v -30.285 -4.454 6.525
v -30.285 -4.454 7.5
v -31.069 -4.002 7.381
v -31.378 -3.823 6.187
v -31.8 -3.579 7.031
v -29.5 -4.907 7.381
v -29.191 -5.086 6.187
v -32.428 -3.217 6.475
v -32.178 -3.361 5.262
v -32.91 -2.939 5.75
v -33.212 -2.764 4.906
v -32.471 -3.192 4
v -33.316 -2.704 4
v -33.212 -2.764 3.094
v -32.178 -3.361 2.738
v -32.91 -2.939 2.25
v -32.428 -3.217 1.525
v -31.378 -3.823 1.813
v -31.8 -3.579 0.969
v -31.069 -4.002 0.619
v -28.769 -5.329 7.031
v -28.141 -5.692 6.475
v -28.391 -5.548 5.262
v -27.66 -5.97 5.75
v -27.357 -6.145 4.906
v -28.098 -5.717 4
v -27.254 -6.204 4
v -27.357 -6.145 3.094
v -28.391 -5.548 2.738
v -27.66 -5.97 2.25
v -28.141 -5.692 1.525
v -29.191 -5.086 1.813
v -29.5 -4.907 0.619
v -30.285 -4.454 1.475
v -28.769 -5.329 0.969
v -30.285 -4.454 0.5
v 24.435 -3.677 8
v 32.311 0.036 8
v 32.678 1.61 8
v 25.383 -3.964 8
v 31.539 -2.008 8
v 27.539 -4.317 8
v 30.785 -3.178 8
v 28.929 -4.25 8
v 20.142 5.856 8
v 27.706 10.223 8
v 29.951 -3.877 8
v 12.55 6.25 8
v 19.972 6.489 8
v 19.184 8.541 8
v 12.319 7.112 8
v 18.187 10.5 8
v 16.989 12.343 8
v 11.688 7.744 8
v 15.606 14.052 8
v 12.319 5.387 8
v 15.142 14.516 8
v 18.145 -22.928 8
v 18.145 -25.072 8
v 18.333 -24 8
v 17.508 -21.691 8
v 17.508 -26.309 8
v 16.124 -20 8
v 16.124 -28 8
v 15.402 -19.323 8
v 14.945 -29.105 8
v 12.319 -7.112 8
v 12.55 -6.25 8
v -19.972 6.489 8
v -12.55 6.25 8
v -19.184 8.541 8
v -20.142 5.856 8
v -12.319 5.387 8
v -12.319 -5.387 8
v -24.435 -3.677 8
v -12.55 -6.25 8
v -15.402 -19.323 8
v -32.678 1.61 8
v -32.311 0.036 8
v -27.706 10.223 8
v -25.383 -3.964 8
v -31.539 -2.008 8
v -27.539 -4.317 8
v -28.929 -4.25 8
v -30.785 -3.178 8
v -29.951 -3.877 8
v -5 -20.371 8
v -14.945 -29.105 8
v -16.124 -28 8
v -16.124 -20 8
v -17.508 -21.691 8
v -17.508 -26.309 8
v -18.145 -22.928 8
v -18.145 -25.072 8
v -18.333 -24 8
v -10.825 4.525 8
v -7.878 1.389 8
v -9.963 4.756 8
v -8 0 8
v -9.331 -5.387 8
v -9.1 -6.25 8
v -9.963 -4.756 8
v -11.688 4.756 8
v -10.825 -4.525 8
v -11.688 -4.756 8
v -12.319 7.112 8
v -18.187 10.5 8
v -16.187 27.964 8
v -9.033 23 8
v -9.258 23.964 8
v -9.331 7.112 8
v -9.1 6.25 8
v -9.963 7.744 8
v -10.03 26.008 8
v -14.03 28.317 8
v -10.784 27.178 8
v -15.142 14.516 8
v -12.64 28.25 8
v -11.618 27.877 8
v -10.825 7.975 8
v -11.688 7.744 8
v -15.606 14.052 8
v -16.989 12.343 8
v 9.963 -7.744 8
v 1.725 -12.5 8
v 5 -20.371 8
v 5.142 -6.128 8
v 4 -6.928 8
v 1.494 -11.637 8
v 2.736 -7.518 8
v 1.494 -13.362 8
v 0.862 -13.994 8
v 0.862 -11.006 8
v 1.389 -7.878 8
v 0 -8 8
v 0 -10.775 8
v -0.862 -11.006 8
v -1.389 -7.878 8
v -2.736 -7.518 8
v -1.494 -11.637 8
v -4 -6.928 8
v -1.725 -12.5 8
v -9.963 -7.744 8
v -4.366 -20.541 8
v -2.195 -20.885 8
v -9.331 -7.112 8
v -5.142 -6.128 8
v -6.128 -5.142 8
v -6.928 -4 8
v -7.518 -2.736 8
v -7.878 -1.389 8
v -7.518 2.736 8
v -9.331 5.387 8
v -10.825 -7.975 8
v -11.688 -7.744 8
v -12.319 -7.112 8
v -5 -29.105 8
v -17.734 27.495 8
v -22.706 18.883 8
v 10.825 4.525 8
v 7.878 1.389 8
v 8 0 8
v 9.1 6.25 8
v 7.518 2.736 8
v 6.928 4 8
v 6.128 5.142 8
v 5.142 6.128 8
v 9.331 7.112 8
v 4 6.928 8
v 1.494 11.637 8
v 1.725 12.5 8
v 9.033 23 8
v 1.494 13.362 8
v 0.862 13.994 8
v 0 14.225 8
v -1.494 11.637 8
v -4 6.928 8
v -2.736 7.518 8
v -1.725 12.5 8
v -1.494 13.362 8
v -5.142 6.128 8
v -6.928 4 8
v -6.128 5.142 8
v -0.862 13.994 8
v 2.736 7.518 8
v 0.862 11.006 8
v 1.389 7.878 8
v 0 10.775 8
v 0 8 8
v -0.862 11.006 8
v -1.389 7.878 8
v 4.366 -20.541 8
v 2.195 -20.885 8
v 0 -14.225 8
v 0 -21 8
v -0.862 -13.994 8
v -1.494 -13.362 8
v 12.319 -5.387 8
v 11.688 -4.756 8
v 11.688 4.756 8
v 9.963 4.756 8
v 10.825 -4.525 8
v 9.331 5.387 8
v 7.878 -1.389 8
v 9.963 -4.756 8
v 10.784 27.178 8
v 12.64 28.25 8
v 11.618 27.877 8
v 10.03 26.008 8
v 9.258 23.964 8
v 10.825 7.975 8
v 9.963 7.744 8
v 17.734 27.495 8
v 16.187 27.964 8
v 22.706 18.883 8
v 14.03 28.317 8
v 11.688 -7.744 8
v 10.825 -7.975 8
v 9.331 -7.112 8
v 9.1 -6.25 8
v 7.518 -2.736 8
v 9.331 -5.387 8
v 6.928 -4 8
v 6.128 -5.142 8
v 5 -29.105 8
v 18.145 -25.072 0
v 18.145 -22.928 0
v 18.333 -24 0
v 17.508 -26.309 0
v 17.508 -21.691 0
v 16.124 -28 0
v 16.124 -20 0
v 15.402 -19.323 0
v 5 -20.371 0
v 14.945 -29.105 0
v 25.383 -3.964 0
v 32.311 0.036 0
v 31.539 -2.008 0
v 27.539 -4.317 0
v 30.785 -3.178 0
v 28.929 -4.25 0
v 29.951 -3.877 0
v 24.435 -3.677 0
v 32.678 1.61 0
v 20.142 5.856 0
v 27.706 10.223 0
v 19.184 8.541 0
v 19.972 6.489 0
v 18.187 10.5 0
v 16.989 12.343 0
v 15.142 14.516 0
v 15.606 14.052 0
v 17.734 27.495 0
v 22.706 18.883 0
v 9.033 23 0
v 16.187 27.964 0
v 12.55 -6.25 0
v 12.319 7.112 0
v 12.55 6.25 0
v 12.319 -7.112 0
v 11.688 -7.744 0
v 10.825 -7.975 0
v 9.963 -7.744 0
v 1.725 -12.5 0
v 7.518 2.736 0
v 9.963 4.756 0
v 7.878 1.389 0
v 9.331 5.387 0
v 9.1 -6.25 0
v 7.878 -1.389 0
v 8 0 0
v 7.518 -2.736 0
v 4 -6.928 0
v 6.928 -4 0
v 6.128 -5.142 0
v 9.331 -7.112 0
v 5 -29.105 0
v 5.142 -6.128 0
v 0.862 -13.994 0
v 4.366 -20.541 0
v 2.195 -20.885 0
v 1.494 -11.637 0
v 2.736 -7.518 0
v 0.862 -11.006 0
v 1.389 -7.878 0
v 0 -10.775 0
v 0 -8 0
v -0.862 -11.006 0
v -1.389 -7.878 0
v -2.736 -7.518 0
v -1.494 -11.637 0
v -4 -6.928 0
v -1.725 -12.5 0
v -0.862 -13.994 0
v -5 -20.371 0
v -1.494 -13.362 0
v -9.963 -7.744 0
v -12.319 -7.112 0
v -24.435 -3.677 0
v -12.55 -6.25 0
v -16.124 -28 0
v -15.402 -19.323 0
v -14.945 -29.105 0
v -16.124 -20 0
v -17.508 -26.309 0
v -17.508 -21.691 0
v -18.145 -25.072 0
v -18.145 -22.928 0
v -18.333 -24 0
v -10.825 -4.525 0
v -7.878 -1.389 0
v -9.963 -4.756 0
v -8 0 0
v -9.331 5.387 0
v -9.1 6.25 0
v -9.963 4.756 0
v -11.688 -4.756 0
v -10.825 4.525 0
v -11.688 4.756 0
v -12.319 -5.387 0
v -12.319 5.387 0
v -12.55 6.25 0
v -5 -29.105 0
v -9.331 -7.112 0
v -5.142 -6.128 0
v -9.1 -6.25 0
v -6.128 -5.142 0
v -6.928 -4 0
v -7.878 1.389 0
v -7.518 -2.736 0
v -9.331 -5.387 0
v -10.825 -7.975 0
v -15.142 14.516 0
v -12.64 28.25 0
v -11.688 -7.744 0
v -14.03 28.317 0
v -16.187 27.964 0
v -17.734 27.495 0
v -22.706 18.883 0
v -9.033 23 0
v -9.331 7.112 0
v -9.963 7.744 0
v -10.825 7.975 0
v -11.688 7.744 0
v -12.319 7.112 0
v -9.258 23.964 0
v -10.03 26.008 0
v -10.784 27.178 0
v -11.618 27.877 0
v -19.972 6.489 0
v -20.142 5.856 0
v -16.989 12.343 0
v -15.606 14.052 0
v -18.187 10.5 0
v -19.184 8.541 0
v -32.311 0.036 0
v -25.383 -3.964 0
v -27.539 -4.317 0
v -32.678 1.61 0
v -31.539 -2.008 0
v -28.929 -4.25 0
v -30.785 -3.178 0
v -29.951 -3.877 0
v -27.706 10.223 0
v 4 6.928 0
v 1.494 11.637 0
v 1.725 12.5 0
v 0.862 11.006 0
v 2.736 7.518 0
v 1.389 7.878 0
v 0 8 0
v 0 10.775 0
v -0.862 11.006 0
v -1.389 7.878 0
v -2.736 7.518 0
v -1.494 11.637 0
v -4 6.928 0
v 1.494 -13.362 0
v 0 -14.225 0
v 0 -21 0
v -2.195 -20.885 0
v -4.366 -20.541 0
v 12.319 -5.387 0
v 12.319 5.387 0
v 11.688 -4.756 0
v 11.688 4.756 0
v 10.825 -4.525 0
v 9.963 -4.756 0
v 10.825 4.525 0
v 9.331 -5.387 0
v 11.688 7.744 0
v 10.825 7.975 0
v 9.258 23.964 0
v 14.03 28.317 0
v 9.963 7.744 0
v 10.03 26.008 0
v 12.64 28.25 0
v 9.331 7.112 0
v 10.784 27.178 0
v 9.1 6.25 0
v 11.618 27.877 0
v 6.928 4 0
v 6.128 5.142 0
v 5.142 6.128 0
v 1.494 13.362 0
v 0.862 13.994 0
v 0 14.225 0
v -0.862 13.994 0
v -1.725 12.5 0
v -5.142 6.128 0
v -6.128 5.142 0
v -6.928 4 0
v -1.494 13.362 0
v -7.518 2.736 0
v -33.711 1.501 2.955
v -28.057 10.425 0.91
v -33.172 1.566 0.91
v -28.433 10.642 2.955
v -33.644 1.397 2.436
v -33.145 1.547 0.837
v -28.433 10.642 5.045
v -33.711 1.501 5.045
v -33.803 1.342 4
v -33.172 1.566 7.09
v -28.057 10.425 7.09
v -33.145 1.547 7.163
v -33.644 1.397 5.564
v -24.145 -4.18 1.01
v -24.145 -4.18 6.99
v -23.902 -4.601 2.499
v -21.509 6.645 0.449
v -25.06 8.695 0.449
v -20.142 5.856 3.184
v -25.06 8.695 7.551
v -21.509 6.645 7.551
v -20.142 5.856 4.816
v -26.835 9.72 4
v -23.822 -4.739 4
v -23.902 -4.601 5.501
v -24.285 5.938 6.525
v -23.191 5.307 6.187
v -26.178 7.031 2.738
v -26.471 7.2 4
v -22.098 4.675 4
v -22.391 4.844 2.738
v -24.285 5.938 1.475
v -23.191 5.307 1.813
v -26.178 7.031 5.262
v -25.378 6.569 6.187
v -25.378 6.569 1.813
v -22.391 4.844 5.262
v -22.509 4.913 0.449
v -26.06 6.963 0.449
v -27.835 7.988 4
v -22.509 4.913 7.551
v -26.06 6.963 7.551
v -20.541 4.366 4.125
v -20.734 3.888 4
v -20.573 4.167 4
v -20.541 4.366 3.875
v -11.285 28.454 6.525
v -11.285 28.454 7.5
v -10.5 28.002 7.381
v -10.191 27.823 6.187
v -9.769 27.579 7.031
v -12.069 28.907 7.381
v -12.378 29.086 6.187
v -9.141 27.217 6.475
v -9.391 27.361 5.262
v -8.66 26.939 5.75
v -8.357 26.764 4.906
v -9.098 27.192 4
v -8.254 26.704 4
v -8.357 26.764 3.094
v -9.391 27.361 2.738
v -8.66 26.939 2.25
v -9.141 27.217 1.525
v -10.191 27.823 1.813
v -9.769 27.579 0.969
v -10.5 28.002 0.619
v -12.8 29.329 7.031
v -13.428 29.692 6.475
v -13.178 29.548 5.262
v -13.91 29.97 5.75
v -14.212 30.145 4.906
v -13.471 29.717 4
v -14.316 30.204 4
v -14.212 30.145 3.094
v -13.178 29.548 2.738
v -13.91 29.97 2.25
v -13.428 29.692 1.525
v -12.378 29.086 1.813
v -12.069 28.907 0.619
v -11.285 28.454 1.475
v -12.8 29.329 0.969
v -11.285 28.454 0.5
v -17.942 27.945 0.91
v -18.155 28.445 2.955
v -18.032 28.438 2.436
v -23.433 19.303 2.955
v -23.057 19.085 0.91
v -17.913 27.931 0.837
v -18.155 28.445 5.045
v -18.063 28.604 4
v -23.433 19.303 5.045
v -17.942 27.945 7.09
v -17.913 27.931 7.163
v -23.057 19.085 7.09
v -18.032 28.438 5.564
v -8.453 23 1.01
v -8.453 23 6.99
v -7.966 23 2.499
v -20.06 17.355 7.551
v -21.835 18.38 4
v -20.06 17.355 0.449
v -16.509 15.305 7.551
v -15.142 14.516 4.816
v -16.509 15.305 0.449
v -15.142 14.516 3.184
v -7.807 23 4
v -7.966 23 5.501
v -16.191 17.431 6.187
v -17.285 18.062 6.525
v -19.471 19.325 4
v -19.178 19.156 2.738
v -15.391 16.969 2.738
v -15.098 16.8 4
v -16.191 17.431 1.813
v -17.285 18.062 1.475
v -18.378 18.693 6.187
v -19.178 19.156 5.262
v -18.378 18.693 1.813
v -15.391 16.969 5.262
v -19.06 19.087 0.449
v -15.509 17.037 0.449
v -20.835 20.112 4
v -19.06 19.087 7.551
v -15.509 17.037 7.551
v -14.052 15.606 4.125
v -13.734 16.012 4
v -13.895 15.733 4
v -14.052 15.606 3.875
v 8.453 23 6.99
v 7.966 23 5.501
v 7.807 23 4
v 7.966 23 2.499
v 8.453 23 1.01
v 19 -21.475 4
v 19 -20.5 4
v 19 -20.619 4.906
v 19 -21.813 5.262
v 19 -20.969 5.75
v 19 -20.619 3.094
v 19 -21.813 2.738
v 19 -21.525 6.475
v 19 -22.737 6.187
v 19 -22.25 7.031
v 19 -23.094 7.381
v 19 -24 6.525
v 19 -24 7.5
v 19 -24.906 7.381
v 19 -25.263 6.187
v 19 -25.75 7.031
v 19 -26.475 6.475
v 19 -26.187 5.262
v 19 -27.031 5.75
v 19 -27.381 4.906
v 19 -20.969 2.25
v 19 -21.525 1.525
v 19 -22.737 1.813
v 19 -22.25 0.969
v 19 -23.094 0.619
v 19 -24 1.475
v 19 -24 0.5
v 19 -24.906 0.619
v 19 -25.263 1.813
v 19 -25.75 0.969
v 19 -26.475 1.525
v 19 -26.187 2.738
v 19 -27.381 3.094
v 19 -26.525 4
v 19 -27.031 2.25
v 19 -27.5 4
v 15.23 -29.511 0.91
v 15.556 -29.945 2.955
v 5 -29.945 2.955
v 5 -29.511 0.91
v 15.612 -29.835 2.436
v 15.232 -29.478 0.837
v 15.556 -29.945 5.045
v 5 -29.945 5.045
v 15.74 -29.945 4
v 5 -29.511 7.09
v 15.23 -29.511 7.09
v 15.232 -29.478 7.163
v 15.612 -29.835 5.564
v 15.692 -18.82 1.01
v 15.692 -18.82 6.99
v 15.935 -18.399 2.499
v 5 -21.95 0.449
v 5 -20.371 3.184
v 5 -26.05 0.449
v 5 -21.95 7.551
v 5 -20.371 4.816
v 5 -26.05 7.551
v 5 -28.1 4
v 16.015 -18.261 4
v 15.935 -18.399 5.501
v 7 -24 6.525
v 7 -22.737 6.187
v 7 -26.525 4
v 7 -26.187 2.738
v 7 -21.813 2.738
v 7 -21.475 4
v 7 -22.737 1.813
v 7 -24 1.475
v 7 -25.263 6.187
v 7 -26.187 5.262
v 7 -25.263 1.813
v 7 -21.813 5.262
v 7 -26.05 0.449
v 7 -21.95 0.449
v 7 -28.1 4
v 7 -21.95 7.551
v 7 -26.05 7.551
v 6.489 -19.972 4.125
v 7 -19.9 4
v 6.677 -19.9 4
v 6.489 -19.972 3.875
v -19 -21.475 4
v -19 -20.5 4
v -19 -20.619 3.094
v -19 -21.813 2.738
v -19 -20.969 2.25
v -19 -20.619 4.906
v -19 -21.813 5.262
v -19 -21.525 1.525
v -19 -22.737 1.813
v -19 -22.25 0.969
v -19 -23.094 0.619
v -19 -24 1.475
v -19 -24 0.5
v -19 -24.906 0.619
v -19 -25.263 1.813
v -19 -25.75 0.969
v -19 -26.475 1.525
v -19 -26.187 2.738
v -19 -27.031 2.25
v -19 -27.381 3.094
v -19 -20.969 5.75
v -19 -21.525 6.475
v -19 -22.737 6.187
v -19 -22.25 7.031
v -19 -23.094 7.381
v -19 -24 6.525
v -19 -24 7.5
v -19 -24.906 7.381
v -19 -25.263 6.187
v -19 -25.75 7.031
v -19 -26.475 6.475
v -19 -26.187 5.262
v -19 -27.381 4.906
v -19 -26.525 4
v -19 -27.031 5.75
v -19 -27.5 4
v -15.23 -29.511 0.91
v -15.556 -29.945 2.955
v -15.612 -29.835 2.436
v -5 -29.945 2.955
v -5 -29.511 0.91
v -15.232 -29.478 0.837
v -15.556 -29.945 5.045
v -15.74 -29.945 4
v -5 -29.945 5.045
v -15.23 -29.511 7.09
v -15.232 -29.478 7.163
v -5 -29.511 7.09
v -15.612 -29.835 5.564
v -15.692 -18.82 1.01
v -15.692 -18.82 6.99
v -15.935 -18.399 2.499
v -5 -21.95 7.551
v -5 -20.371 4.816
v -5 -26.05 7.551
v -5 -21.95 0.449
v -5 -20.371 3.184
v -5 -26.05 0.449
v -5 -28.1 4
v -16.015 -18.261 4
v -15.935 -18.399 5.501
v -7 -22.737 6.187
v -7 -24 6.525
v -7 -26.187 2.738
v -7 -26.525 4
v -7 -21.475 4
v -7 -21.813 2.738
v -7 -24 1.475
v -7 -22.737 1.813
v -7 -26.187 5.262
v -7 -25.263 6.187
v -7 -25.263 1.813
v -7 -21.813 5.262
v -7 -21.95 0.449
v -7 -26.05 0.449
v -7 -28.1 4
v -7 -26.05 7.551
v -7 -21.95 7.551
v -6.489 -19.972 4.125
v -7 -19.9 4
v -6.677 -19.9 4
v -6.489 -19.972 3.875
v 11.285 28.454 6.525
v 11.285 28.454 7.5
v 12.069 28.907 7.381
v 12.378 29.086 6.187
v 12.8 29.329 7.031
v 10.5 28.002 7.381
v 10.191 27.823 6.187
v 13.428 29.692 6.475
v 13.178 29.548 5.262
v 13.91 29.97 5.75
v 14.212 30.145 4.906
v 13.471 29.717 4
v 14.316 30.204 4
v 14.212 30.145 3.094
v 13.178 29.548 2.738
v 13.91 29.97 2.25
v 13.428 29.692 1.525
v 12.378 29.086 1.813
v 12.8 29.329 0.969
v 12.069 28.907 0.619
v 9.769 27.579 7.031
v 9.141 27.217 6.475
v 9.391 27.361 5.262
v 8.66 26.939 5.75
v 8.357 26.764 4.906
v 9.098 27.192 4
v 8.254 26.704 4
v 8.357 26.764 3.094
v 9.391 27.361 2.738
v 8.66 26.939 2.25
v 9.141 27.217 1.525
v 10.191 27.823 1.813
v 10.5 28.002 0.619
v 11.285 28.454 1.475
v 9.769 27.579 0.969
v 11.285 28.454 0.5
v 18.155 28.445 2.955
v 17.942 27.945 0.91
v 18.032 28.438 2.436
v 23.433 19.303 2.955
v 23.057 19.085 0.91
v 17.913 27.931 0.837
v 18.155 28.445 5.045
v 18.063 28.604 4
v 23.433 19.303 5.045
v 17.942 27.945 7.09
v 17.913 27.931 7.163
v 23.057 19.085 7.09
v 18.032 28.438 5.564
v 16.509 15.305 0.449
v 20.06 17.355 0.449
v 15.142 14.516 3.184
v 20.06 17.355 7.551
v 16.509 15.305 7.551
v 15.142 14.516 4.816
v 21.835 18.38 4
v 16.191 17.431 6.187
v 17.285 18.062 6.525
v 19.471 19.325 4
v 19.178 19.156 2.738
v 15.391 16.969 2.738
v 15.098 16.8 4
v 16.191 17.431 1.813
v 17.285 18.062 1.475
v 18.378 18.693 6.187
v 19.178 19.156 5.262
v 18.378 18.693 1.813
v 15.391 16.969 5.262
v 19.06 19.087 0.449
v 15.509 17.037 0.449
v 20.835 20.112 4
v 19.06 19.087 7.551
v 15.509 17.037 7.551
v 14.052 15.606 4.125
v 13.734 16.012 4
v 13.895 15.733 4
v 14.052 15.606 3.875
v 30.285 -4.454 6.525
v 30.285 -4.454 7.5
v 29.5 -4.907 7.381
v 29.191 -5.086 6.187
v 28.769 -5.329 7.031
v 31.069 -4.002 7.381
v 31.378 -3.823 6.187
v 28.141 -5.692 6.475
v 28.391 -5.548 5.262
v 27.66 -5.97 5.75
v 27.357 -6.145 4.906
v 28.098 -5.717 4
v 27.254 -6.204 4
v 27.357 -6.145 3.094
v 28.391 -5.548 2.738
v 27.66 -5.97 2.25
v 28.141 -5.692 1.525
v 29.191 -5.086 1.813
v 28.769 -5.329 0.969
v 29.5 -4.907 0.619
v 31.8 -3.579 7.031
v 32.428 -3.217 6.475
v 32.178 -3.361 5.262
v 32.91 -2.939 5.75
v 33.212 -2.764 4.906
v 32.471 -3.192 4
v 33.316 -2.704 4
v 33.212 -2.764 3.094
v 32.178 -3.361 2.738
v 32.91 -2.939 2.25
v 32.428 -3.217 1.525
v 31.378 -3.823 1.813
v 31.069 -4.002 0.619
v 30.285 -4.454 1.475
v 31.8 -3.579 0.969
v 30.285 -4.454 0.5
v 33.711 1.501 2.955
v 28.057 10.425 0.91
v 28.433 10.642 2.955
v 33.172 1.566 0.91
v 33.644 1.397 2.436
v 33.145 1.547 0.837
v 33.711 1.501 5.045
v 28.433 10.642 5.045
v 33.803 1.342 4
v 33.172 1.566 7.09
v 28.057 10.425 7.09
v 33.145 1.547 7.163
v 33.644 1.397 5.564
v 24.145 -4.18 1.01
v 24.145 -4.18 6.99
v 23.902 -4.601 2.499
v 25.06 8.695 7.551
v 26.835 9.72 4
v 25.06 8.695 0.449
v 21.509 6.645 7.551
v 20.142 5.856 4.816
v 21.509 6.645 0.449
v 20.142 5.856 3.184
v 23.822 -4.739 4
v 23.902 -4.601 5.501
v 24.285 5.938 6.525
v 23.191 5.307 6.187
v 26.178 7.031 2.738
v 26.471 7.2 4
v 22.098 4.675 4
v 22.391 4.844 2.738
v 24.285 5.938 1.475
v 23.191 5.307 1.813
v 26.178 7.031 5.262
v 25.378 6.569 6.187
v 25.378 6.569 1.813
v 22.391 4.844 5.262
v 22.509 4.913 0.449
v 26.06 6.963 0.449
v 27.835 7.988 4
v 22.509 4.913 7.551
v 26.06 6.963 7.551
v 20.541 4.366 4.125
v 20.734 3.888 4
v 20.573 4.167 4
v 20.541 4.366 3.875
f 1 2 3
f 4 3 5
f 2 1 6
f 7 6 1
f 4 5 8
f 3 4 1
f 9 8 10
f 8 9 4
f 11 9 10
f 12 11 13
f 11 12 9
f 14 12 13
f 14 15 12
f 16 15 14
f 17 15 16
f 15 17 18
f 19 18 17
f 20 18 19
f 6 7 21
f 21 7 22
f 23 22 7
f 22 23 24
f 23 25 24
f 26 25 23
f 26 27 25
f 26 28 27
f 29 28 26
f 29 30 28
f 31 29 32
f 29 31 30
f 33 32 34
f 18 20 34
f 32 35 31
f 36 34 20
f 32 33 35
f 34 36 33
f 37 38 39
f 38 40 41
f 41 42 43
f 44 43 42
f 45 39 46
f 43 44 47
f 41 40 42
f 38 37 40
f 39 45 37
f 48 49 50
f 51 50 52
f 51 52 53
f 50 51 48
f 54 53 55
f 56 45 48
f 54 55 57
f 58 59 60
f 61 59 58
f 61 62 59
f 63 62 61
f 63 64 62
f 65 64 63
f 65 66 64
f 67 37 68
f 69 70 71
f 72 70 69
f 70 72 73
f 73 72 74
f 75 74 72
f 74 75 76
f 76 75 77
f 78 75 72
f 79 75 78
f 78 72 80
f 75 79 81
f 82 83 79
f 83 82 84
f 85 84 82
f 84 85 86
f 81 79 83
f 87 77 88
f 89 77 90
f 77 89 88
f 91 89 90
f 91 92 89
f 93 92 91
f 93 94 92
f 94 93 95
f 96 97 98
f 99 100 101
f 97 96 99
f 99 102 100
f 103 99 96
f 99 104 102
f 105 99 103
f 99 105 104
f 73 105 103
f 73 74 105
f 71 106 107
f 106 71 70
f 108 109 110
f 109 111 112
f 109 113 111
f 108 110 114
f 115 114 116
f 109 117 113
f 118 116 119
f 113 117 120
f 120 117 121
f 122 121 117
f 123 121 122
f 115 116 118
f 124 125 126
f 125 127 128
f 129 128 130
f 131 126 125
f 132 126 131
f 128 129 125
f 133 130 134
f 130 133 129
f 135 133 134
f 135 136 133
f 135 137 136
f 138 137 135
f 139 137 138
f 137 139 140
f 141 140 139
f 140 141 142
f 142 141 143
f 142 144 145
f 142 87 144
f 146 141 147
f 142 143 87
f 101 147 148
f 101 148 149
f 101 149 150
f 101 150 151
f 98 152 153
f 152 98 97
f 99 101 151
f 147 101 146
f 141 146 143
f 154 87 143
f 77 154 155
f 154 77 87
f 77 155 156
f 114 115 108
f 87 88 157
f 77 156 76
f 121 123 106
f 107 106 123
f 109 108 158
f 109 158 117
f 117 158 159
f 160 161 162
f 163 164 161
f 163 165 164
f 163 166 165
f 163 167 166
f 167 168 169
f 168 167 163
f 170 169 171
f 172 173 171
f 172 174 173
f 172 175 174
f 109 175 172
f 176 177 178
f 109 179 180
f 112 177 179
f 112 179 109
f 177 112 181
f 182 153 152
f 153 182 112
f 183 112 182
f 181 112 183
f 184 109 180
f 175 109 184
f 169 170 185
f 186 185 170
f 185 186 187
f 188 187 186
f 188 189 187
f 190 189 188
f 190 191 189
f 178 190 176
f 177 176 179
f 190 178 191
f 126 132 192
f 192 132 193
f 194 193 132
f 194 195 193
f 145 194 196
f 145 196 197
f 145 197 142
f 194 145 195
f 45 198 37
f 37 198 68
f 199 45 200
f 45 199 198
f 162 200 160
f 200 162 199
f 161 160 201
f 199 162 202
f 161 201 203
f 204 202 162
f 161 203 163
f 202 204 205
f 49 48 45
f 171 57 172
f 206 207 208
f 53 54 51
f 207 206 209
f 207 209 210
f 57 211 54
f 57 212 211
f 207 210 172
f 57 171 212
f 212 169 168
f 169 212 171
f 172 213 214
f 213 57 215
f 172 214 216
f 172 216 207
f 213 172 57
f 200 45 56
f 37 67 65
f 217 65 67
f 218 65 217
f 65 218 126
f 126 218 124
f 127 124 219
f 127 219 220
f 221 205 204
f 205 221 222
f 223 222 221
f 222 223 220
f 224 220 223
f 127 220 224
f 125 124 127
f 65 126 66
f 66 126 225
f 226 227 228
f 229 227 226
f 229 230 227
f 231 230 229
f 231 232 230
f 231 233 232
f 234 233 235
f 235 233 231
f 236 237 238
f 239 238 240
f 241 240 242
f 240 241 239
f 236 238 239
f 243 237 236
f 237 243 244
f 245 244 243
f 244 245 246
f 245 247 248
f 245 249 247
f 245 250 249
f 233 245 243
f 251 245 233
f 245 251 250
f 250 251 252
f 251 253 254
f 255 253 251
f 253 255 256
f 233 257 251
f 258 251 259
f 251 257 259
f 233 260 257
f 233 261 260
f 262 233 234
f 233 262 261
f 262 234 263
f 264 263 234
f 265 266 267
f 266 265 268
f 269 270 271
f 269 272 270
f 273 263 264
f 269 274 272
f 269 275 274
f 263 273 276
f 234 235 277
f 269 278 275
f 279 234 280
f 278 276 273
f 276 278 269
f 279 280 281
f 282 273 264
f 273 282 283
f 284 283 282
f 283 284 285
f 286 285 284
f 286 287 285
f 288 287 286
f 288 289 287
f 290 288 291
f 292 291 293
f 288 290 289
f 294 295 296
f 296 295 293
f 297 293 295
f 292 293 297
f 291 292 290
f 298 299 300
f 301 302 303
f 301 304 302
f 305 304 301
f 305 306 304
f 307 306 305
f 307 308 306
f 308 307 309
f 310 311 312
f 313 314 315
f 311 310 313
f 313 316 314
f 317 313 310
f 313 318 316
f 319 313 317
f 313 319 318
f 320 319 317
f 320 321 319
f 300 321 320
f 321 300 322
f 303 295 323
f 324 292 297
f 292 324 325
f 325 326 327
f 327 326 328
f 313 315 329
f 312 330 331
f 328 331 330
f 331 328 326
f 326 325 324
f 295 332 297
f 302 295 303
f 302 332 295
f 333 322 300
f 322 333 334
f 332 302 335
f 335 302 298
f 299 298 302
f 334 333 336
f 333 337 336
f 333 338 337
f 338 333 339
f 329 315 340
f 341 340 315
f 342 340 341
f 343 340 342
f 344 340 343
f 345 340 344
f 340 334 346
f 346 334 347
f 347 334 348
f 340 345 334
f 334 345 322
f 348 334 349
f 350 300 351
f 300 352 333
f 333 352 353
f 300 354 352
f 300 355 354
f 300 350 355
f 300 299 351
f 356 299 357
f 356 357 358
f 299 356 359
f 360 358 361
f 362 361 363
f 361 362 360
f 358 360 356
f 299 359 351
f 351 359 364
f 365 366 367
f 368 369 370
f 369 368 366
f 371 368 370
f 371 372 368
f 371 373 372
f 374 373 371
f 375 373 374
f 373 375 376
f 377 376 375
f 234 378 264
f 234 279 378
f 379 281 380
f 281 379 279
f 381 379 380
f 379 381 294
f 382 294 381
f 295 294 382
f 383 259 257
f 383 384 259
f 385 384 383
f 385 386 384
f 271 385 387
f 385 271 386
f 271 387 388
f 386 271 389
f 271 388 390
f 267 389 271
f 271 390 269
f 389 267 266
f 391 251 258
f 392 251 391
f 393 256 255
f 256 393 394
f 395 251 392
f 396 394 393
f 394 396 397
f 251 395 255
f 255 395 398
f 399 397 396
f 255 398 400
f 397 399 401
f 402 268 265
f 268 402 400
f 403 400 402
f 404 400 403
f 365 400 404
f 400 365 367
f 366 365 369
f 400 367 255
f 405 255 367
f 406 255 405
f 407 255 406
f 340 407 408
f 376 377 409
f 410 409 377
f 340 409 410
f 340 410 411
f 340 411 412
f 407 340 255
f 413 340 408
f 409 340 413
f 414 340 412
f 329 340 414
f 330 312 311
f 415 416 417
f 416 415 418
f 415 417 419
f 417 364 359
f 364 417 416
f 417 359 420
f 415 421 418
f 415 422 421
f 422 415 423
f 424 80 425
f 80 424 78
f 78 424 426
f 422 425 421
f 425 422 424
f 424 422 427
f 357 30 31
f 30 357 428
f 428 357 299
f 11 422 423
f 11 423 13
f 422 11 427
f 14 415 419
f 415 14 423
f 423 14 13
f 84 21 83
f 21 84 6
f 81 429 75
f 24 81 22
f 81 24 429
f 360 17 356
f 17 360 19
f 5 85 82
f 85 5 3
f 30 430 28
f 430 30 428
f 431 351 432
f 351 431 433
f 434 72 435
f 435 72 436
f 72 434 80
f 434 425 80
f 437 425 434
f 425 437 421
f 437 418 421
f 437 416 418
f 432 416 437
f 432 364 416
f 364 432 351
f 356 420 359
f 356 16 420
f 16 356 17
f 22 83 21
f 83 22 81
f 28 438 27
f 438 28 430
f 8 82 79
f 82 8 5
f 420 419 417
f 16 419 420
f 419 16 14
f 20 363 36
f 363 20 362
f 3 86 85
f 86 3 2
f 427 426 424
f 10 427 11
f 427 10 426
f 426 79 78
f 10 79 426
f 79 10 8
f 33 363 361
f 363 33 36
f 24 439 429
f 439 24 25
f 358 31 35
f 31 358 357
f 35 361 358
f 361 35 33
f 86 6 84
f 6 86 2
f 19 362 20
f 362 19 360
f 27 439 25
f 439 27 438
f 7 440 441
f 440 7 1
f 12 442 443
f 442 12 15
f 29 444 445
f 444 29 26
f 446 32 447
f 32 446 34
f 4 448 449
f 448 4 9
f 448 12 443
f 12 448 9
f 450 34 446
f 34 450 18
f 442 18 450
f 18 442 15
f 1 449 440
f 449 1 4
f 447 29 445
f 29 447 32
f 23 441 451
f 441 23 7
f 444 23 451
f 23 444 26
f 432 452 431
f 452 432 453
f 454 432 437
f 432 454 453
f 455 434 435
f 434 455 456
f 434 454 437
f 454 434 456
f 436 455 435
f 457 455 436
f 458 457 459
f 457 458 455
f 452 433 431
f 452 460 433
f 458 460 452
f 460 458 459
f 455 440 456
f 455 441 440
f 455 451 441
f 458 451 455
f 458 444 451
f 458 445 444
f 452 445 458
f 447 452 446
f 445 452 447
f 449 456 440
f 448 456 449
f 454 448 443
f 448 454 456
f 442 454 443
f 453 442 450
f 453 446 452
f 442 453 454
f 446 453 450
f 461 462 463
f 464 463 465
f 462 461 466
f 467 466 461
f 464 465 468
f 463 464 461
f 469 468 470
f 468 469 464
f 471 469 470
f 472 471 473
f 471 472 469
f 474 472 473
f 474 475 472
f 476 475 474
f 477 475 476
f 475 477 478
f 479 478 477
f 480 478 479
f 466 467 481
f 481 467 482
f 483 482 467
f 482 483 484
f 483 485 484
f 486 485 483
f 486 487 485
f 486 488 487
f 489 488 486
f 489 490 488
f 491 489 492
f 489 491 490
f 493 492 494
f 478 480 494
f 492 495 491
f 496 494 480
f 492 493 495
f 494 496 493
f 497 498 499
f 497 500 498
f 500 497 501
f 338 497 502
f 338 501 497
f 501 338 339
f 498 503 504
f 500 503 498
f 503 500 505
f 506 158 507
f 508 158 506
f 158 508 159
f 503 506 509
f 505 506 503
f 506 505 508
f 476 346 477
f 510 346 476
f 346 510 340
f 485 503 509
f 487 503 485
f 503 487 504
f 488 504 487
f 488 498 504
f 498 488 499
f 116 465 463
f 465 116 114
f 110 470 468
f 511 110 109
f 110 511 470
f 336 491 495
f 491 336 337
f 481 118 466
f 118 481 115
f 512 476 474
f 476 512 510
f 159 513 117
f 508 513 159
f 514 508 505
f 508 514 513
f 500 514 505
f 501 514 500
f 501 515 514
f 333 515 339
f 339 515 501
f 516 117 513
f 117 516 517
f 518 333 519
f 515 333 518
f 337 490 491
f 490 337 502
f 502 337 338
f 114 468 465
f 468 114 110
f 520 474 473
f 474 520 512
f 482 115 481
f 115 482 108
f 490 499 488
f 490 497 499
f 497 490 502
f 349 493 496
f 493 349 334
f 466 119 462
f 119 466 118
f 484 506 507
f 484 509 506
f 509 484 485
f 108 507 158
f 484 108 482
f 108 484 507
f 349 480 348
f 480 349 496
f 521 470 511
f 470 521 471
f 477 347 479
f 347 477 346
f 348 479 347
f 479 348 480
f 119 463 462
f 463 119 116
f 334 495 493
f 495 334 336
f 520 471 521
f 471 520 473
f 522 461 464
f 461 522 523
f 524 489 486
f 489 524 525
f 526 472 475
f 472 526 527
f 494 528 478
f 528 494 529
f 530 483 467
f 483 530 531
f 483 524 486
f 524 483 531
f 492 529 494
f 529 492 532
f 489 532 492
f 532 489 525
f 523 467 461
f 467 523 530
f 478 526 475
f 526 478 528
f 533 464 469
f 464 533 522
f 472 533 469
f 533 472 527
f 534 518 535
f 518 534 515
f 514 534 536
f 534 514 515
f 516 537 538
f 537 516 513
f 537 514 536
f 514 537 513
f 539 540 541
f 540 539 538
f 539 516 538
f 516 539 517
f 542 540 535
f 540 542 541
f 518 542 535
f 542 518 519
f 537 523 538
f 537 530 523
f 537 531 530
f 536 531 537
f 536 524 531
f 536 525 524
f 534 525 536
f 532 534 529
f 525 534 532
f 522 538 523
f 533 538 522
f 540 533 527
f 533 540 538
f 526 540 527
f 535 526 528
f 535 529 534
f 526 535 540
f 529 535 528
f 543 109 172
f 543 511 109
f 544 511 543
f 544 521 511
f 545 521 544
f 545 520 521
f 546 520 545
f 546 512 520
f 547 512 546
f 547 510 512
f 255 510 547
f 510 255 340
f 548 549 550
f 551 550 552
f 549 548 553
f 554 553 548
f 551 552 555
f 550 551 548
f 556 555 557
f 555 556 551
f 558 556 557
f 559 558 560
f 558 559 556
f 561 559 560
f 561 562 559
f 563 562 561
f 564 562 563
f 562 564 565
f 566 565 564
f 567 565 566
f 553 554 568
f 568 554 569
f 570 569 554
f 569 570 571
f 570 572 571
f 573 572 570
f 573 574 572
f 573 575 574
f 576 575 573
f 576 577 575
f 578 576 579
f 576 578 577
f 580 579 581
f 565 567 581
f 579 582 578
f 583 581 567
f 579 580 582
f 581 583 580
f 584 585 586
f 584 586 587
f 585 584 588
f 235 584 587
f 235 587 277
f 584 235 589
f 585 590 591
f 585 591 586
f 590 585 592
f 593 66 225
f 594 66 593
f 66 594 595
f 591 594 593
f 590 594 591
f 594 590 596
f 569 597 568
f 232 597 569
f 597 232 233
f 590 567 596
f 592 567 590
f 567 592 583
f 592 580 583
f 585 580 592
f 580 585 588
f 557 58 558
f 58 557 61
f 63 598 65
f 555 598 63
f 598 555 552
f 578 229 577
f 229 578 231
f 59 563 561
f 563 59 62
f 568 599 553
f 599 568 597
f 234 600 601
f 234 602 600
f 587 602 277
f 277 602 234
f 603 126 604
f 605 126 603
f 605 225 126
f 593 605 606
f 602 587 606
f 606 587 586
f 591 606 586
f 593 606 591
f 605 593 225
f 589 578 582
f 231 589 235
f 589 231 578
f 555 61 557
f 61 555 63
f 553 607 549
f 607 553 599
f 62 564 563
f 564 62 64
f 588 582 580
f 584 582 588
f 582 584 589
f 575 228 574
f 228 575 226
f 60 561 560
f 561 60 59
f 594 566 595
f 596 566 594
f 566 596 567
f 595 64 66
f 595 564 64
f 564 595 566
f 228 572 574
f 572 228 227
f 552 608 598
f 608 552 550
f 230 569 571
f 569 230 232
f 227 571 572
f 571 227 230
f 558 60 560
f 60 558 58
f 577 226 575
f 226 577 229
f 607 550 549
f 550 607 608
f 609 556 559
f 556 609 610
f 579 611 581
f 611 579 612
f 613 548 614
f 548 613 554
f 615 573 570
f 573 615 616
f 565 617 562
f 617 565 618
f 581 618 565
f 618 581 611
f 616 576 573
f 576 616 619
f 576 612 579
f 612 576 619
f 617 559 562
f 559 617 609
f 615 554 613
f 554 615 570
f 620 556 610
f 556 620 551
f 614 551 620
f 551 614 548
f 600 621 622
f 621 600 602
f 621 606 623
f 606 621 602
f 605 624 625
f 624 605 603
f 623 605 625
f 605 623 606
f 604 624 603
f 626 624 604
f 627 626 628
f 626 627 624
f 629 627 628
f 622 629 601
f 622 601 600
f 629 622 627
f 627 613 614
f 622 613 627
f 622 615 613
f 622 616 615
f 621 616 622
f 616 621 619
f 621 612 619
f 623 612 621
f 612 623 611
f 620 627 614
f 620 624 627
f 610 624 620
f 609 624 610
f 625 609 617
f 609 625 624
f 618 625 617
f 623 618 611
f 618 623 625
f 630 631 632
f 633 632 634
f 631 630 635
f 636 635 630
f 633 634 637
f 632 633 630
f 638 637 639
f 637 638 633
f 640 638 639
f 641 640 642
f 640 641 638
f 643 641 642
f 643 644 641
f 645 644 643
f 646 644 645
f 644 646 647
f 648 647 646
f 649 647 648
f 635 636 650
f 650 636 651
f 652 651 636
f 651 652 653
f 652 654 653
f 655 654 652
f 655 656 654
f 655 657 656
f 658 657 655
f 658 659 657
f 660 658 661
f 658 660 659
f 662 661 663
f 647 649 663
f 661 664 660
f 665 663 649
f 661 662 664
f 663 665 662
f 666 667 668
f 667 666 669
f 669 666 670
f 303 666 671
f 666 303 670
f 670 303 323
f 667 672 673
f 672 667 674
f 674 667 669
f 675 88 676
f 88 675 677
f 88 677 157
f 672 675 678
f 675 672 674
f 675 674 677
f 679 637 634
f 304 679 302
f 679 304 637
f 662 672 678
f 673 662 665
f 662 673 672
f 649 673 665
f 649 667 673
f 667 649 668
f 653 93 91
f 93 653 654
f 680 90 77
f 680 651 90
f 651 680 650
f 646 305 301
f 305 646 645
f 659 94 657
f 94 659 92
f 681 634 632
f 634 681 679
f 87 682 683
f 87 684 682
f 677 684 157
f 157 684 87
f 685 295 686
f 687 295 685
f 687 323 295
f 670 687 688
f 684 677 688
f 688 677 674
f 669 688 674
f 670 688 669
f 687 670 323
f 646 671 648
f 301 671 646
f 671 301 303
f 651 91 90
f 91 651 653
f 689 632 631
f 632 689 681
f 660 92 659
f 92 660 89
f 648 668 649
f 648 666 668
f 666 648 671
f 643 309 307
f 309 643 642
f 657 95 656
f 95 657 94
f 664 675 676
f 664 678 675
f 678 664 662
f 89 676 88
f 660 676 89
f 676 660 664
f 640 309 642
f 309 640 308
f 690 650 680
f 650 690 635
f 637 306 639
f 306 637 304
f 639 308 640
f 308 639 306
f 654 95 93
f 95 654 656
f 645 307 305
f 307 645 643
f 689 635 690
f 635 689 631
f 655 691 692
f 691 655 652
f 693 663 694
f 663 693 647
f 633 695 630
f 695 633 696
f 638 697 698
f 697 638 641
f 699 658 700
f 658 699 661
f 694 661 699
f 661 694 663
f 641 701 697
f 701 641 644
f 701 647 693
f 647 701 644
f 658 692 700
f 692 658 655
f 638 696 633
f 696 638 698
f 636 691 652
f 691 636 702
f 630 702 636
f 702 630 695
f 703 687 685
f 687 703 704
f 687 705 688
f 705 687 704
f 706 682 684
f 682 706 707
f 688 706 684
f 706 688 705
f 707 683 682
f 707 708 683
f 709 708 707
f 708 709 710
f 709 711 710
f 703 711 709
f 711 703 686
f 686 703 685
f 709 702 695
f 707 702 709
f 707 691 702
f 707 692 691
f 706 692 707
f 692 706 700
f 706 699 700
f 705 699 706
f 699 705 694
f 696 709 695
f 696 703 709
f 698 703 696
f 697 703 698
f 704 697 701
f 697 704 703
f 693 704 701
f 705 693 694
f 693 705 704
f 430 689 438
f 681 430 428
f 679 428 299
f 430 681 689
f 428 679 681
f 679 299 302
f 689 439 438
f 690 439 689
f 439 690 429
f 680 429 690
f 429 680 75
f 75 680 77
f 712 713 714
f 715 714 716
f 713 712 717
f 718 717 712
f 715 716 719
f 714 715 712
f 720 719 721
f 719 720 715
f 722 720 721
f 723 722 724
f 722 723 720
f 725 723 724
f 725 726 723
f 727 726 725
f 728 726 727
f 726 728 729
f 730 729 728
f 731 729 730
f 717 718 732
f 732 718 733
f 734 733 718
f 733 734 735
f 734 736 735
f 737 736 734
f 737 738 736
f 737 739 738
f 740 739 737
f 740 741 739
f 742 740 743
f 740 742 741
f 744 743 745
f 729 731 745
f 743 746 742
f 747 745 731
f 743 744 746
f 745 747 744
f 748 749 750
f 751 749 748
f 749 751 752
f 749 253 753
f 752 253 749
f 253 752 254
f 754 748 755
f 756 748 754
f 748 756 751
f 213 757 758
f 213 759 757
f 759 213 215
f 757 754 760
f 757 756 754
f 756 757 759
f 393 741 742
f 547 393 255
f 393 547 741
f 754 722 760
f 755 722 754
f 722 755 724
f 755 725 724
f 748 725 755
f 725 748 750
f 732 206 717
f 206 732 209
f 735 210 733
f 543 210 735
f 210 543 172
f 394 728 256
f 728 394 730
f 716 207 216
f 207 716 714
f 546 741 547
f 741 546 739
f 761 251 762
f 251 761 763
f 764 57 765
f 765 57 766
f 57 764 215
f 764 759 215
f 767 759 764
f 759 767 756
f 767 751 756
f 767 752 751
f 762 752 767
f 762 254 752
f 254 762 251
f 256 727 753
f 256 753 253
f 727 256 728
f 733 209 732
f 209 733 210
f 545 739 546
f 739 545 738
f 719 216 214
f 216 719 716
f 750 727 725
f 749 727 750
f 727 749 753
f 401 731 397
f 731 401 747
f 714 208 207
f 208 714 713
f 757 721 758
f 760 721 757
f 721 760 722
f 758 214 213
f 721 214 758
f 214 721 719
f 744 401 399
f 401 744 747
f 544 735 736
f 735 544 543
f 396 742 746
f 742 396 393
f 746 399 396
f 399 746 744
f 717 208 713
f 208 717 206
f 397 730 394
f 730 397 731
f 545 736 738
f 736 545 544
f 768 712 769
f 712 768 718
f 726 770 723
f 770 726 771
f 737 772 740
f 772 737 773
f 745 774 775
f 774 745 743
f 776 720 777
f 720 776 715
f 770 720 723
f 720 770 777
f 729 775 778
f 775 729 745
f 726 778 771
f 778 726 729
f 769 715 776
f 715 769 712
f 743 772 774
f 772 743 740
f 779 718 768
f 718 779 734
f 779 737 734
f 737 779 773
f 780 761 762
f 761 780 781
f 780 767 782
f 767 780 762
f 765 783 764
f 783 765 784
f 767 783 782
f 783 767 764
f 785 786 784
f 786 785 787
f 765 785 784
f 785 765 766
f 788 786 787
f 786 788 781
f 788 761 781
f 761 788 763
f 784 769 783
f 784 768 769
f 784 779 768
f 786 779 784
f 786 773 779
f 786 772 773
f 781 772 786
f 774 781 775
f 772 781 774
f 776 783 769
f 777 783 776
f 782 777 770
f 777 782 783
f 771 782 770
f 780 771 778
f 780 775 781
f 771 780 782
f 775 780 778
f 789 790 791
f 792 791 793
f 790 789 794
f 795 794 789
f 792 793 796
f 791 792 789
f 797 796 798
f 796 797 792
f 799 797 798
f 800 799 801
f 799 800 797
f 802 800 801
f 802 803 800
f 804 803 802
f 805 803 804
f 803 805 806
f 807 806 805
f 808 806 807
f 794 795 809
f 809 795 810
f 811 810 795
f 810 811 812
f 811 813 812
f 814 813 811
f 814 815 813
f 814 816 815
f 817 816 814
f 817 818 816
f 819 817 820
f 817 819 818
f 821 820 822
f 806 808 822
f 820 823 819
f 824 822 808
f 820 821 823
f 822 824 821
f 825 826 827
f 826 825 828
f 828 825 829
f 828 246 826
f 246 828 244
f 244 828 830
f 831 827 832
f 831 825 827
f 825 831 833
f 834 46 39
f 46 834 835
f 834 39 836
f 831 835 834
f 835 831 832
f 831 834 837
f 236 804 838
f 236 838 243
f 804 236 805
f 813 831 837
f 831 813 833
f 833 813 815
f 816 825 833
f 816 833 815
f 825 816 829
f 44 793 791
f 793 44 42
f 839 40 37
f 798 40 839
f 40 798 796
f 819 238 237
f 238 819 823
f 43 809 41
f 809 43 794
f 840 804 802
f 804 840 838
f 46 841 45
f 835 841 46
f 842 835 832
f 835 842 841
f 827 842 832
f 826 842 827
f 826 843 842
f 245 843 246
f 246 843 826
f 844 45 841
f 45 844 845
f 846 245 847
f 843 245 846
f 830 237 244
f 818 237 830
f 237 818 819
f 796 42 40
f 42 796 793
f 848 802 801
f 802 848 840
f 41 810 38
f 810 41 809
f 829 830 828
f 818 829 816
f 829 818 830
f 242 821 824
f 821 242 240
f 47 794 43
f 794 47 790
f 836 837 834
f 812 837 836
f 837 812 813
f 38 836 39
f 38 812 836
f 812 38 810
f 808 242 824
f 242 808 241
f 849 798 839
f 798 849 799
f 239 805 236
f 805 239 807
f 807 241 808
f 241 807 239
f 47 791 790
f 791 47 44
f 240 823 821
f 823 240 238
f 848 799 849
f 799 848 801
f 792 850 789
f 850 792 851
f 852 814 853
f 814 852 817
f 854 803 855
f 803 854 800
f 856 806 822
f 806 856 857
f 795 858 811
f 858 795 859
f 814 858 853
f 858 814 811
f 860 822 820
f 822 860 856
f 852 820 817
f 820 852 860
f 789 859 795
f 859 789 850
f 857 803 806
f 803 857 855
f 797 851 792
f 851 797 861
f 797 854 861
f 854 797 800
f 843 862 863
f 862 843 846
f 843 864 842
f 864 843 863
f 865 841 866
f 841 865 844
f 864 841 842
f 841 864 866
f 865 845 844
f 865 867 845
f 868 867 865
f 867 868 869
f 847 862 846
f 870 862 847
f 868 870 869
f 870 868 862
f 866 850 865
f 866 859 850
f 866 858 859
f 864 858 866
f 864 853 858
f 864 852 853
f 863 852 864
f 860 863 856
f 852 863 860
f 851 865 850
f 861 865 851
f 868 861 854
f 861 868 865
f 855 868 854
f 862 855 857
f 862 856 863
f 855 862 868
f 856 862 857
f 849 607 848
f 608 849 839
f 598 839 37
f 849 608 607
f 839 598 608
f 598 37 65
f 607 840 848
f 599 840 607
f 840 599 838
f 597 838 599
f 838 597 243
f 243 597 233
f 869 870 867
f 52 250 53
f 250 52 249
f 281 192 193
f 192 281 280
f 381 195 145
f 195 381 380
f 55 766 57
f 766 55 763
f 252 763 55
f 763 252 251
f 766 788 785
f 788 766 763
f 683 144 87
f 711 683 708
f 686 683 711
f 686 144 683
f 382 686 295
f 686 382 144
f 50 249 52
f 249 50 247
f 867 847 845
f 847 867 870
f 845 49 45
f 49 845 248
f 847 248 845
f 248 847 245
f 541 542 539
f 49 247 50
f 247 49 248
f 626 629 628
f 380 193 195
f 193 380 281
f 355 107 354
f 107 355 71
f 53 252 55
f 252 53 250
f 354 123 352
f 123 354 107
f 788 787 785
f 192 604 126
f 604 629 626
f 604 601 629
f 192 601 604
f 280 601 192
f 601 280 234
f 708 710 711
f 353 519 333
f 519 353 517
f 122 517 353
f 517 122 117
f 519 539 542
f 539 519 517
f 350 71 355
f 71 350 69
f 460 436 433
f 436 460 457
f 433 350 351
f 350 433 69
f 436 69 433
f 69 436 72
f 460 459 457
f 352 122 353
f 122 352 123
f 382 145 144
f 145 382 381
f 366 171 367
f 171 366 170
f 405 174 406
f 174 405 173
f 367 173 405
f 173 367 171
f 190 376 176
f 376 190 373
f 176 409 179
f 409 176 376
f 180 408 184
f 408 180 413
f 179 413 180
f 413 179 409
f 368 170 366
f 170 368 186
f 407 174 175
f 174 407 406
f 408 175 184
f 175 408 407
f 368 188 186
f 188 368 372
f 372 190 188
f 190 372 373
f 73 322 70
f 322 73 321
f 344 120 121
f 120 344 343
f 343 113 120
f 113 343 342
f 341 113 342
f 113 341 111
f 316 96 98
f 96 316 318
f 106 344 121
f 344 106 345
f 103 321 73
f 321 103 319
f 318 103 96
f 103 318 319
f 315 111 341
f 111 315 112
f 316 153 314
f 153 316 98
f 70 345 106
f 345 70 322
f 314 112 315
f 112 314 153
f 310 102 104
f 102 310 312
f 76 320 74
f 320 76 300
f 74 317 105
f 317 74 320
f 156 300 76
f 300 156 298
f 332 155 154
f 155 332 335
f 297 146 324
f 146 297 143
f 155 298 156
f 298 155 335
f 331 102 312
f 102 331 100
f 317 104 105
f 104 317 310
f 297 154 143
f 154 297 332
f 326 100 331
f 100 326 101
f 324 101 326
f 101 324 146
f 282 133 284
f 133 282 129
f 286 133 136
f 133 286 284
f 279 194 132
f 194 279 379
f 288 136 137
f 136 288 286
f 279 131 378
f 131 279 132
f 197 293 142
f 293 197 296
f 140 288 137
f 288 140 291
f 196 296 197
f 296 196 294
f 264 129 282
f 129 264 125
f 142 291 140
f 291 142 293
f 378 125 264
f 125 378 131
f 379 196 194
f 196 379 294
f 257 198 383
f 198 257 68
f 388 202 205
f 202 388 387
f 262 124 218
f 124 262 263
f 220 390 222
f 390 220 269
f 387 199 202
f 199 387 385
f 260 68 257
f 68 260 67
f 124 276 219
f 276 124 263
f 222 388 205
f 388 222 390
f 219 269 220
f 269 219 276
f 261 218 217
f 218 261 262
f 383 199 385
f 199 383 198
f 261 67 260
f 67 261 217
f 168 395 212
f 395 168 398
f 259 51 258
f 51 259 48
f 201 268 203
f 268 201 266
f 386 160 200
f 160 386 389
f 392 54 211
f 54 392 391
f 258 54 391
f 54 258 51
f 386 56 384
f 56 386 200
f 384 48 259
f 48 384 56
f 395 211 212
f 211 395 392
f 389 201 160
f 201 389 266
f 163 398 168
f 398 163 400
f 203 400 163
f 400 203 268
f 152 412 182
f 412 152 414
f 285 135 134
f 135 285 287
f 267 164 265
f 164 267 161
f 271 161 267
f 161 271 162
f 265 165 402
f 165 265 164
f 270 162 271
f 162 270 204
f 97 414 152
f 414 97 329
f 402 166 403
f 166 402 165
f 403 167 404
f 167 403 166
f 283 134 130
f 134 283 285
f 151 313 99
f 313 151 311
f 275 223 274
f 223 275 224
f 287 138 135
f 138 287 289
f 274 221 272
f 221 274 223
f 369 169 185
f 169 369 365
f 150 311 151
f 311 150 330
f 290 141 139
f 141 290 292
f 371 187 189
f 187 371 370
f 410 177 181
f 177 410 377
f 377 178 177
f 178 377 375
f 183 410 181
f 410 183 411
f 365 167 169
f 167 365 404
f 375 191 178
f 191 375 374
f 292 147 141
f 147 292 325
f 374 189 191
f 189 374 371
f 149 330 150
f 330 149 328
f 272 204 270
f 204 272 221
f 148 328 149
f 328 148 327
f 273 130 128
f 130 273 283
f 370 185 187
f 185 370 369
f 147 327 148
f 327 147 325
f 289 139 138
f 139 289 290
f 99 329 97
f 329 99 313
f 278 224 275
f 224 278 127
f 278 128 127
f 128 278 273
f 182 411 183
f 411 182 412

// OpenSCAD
// file: configuration.scad
// Increase this if your slicer or printer make holes too tight.
extra_radius = 0.1;

// OD = outside diameter, corner to corner.
m3_nut_od = 6.1;
m3_nut_radius = m3_nut_od/2 + 0.2 + extra_radius;
m3_washer_radius = 3.5 + extra_radius;

m4_nut_od = 7.6;
m4_nut_radius = m4_nut_od/2 + 0.2 + extra_radius;
m4_washer_radius = 4.4 + extra_radius;

// Major diameter of metric 3mm thread.
m3_major = 2.85;
m3_radius = m3_major/2 + extra_radius;
m3_wide_radius = m3_major/2 + extra_radius + 0.2;

// Major diameter of metric 4mm thread.
m4_major = 4.85;
m4_radius = m4_major/2 + extra_radius;
m4_wide_radius = m4_major/2 + extra_radius + 0.2;


// NEMA17 stepper motors.
motor_shaft_diameter = 5;
motor_shaft_radius = motor_shaft_diameter/2 + extra_radius;

// Frame brackets. M3x8mm screws work best with 3.6 mm brackets.
thickness = 3.6;

// OpenBeam or Misumi. Currently only 15x15 mm, but there is a plan
// to make models more parametric and allow 20x20 mm in the future.
extrusion = 15;

// Placement for the NEMA17 stepper motors.
motor_offset = 44;
motor_length = 47;
// main file
include <configuration.scad>;

separation = 38;  // Distance between ball joint mounting faces.
offset = 24;  // Same as DELTA_EFFECTOR_OFFSET in Marlin.
mount_radius = 12.5;  // Hotend mounting screws, standard would be 25mm.
hotend_radius = 8;  // Hole for the hotend (J-Head diameter is 16mm).
push_fit_height = 4;  // Length of brass threaded into printed plastic.
height = 8;
cone_r1 = 3.5;
cone_r2 = 14;

// The size of the nuts and bolts holding the spider arms
bolt_radius = m4_radius;
nut_radius = m4_nut_radius;


module effector() {
  difference() {
    union() {
      cylinder(r=offset-3, h=height, center=true, $fn=60);
      for (a = [60:120:359]) rotate([0, 0, a]) {
	rotate([0, 0, 30]) translate([offset-6, 0, 0])
	  cube([10, 19, height], center=true);
	for (s = [-1, 1]) scale([s, 1, 1]) {
	  translate([0, offset, 0]) difference() {
	    intersection() {
	      cube([separation, 40, height], center=true);
	      translate([0, -4, 0]) rotate([0, 90, 0])
		cylinder(r=10, h=separation, center=true);
	      translate([separation/2-7, 0, 0]) rotate([0, 90, 0])
		cylinder(r1=cone_r2, r2=cone_r1, h=14, center=true, $fn=24);
	    }
	    rotate([0, 90, 0])
	      cylinder(r=bolt_radius, h=separation+1, center=true, $fn=12);
	    rotate([90, 0, 90])
	      cylinder(r=nut_radius, h=separation-24, center=true, $fn=6);
	  }
        }
      }
    }
    //translate([0, 0, push_fit_height-height/2])
    translate([0,0,-height])
      cylinder(r=hotend_radius, h=height*2, $fn=36);
    //translate([0, 0, -6]) # import("m5_internal.stl");
    for (a = [0:60:359]) rotate([0, 0, a]) {
      translate([0, mount_radius, 0])
	cylinder(r=m3_wide_radius, h=2*height, center=true, $fn=12);
    }
  }
}

translate([0, 0, height/2]) effector();
